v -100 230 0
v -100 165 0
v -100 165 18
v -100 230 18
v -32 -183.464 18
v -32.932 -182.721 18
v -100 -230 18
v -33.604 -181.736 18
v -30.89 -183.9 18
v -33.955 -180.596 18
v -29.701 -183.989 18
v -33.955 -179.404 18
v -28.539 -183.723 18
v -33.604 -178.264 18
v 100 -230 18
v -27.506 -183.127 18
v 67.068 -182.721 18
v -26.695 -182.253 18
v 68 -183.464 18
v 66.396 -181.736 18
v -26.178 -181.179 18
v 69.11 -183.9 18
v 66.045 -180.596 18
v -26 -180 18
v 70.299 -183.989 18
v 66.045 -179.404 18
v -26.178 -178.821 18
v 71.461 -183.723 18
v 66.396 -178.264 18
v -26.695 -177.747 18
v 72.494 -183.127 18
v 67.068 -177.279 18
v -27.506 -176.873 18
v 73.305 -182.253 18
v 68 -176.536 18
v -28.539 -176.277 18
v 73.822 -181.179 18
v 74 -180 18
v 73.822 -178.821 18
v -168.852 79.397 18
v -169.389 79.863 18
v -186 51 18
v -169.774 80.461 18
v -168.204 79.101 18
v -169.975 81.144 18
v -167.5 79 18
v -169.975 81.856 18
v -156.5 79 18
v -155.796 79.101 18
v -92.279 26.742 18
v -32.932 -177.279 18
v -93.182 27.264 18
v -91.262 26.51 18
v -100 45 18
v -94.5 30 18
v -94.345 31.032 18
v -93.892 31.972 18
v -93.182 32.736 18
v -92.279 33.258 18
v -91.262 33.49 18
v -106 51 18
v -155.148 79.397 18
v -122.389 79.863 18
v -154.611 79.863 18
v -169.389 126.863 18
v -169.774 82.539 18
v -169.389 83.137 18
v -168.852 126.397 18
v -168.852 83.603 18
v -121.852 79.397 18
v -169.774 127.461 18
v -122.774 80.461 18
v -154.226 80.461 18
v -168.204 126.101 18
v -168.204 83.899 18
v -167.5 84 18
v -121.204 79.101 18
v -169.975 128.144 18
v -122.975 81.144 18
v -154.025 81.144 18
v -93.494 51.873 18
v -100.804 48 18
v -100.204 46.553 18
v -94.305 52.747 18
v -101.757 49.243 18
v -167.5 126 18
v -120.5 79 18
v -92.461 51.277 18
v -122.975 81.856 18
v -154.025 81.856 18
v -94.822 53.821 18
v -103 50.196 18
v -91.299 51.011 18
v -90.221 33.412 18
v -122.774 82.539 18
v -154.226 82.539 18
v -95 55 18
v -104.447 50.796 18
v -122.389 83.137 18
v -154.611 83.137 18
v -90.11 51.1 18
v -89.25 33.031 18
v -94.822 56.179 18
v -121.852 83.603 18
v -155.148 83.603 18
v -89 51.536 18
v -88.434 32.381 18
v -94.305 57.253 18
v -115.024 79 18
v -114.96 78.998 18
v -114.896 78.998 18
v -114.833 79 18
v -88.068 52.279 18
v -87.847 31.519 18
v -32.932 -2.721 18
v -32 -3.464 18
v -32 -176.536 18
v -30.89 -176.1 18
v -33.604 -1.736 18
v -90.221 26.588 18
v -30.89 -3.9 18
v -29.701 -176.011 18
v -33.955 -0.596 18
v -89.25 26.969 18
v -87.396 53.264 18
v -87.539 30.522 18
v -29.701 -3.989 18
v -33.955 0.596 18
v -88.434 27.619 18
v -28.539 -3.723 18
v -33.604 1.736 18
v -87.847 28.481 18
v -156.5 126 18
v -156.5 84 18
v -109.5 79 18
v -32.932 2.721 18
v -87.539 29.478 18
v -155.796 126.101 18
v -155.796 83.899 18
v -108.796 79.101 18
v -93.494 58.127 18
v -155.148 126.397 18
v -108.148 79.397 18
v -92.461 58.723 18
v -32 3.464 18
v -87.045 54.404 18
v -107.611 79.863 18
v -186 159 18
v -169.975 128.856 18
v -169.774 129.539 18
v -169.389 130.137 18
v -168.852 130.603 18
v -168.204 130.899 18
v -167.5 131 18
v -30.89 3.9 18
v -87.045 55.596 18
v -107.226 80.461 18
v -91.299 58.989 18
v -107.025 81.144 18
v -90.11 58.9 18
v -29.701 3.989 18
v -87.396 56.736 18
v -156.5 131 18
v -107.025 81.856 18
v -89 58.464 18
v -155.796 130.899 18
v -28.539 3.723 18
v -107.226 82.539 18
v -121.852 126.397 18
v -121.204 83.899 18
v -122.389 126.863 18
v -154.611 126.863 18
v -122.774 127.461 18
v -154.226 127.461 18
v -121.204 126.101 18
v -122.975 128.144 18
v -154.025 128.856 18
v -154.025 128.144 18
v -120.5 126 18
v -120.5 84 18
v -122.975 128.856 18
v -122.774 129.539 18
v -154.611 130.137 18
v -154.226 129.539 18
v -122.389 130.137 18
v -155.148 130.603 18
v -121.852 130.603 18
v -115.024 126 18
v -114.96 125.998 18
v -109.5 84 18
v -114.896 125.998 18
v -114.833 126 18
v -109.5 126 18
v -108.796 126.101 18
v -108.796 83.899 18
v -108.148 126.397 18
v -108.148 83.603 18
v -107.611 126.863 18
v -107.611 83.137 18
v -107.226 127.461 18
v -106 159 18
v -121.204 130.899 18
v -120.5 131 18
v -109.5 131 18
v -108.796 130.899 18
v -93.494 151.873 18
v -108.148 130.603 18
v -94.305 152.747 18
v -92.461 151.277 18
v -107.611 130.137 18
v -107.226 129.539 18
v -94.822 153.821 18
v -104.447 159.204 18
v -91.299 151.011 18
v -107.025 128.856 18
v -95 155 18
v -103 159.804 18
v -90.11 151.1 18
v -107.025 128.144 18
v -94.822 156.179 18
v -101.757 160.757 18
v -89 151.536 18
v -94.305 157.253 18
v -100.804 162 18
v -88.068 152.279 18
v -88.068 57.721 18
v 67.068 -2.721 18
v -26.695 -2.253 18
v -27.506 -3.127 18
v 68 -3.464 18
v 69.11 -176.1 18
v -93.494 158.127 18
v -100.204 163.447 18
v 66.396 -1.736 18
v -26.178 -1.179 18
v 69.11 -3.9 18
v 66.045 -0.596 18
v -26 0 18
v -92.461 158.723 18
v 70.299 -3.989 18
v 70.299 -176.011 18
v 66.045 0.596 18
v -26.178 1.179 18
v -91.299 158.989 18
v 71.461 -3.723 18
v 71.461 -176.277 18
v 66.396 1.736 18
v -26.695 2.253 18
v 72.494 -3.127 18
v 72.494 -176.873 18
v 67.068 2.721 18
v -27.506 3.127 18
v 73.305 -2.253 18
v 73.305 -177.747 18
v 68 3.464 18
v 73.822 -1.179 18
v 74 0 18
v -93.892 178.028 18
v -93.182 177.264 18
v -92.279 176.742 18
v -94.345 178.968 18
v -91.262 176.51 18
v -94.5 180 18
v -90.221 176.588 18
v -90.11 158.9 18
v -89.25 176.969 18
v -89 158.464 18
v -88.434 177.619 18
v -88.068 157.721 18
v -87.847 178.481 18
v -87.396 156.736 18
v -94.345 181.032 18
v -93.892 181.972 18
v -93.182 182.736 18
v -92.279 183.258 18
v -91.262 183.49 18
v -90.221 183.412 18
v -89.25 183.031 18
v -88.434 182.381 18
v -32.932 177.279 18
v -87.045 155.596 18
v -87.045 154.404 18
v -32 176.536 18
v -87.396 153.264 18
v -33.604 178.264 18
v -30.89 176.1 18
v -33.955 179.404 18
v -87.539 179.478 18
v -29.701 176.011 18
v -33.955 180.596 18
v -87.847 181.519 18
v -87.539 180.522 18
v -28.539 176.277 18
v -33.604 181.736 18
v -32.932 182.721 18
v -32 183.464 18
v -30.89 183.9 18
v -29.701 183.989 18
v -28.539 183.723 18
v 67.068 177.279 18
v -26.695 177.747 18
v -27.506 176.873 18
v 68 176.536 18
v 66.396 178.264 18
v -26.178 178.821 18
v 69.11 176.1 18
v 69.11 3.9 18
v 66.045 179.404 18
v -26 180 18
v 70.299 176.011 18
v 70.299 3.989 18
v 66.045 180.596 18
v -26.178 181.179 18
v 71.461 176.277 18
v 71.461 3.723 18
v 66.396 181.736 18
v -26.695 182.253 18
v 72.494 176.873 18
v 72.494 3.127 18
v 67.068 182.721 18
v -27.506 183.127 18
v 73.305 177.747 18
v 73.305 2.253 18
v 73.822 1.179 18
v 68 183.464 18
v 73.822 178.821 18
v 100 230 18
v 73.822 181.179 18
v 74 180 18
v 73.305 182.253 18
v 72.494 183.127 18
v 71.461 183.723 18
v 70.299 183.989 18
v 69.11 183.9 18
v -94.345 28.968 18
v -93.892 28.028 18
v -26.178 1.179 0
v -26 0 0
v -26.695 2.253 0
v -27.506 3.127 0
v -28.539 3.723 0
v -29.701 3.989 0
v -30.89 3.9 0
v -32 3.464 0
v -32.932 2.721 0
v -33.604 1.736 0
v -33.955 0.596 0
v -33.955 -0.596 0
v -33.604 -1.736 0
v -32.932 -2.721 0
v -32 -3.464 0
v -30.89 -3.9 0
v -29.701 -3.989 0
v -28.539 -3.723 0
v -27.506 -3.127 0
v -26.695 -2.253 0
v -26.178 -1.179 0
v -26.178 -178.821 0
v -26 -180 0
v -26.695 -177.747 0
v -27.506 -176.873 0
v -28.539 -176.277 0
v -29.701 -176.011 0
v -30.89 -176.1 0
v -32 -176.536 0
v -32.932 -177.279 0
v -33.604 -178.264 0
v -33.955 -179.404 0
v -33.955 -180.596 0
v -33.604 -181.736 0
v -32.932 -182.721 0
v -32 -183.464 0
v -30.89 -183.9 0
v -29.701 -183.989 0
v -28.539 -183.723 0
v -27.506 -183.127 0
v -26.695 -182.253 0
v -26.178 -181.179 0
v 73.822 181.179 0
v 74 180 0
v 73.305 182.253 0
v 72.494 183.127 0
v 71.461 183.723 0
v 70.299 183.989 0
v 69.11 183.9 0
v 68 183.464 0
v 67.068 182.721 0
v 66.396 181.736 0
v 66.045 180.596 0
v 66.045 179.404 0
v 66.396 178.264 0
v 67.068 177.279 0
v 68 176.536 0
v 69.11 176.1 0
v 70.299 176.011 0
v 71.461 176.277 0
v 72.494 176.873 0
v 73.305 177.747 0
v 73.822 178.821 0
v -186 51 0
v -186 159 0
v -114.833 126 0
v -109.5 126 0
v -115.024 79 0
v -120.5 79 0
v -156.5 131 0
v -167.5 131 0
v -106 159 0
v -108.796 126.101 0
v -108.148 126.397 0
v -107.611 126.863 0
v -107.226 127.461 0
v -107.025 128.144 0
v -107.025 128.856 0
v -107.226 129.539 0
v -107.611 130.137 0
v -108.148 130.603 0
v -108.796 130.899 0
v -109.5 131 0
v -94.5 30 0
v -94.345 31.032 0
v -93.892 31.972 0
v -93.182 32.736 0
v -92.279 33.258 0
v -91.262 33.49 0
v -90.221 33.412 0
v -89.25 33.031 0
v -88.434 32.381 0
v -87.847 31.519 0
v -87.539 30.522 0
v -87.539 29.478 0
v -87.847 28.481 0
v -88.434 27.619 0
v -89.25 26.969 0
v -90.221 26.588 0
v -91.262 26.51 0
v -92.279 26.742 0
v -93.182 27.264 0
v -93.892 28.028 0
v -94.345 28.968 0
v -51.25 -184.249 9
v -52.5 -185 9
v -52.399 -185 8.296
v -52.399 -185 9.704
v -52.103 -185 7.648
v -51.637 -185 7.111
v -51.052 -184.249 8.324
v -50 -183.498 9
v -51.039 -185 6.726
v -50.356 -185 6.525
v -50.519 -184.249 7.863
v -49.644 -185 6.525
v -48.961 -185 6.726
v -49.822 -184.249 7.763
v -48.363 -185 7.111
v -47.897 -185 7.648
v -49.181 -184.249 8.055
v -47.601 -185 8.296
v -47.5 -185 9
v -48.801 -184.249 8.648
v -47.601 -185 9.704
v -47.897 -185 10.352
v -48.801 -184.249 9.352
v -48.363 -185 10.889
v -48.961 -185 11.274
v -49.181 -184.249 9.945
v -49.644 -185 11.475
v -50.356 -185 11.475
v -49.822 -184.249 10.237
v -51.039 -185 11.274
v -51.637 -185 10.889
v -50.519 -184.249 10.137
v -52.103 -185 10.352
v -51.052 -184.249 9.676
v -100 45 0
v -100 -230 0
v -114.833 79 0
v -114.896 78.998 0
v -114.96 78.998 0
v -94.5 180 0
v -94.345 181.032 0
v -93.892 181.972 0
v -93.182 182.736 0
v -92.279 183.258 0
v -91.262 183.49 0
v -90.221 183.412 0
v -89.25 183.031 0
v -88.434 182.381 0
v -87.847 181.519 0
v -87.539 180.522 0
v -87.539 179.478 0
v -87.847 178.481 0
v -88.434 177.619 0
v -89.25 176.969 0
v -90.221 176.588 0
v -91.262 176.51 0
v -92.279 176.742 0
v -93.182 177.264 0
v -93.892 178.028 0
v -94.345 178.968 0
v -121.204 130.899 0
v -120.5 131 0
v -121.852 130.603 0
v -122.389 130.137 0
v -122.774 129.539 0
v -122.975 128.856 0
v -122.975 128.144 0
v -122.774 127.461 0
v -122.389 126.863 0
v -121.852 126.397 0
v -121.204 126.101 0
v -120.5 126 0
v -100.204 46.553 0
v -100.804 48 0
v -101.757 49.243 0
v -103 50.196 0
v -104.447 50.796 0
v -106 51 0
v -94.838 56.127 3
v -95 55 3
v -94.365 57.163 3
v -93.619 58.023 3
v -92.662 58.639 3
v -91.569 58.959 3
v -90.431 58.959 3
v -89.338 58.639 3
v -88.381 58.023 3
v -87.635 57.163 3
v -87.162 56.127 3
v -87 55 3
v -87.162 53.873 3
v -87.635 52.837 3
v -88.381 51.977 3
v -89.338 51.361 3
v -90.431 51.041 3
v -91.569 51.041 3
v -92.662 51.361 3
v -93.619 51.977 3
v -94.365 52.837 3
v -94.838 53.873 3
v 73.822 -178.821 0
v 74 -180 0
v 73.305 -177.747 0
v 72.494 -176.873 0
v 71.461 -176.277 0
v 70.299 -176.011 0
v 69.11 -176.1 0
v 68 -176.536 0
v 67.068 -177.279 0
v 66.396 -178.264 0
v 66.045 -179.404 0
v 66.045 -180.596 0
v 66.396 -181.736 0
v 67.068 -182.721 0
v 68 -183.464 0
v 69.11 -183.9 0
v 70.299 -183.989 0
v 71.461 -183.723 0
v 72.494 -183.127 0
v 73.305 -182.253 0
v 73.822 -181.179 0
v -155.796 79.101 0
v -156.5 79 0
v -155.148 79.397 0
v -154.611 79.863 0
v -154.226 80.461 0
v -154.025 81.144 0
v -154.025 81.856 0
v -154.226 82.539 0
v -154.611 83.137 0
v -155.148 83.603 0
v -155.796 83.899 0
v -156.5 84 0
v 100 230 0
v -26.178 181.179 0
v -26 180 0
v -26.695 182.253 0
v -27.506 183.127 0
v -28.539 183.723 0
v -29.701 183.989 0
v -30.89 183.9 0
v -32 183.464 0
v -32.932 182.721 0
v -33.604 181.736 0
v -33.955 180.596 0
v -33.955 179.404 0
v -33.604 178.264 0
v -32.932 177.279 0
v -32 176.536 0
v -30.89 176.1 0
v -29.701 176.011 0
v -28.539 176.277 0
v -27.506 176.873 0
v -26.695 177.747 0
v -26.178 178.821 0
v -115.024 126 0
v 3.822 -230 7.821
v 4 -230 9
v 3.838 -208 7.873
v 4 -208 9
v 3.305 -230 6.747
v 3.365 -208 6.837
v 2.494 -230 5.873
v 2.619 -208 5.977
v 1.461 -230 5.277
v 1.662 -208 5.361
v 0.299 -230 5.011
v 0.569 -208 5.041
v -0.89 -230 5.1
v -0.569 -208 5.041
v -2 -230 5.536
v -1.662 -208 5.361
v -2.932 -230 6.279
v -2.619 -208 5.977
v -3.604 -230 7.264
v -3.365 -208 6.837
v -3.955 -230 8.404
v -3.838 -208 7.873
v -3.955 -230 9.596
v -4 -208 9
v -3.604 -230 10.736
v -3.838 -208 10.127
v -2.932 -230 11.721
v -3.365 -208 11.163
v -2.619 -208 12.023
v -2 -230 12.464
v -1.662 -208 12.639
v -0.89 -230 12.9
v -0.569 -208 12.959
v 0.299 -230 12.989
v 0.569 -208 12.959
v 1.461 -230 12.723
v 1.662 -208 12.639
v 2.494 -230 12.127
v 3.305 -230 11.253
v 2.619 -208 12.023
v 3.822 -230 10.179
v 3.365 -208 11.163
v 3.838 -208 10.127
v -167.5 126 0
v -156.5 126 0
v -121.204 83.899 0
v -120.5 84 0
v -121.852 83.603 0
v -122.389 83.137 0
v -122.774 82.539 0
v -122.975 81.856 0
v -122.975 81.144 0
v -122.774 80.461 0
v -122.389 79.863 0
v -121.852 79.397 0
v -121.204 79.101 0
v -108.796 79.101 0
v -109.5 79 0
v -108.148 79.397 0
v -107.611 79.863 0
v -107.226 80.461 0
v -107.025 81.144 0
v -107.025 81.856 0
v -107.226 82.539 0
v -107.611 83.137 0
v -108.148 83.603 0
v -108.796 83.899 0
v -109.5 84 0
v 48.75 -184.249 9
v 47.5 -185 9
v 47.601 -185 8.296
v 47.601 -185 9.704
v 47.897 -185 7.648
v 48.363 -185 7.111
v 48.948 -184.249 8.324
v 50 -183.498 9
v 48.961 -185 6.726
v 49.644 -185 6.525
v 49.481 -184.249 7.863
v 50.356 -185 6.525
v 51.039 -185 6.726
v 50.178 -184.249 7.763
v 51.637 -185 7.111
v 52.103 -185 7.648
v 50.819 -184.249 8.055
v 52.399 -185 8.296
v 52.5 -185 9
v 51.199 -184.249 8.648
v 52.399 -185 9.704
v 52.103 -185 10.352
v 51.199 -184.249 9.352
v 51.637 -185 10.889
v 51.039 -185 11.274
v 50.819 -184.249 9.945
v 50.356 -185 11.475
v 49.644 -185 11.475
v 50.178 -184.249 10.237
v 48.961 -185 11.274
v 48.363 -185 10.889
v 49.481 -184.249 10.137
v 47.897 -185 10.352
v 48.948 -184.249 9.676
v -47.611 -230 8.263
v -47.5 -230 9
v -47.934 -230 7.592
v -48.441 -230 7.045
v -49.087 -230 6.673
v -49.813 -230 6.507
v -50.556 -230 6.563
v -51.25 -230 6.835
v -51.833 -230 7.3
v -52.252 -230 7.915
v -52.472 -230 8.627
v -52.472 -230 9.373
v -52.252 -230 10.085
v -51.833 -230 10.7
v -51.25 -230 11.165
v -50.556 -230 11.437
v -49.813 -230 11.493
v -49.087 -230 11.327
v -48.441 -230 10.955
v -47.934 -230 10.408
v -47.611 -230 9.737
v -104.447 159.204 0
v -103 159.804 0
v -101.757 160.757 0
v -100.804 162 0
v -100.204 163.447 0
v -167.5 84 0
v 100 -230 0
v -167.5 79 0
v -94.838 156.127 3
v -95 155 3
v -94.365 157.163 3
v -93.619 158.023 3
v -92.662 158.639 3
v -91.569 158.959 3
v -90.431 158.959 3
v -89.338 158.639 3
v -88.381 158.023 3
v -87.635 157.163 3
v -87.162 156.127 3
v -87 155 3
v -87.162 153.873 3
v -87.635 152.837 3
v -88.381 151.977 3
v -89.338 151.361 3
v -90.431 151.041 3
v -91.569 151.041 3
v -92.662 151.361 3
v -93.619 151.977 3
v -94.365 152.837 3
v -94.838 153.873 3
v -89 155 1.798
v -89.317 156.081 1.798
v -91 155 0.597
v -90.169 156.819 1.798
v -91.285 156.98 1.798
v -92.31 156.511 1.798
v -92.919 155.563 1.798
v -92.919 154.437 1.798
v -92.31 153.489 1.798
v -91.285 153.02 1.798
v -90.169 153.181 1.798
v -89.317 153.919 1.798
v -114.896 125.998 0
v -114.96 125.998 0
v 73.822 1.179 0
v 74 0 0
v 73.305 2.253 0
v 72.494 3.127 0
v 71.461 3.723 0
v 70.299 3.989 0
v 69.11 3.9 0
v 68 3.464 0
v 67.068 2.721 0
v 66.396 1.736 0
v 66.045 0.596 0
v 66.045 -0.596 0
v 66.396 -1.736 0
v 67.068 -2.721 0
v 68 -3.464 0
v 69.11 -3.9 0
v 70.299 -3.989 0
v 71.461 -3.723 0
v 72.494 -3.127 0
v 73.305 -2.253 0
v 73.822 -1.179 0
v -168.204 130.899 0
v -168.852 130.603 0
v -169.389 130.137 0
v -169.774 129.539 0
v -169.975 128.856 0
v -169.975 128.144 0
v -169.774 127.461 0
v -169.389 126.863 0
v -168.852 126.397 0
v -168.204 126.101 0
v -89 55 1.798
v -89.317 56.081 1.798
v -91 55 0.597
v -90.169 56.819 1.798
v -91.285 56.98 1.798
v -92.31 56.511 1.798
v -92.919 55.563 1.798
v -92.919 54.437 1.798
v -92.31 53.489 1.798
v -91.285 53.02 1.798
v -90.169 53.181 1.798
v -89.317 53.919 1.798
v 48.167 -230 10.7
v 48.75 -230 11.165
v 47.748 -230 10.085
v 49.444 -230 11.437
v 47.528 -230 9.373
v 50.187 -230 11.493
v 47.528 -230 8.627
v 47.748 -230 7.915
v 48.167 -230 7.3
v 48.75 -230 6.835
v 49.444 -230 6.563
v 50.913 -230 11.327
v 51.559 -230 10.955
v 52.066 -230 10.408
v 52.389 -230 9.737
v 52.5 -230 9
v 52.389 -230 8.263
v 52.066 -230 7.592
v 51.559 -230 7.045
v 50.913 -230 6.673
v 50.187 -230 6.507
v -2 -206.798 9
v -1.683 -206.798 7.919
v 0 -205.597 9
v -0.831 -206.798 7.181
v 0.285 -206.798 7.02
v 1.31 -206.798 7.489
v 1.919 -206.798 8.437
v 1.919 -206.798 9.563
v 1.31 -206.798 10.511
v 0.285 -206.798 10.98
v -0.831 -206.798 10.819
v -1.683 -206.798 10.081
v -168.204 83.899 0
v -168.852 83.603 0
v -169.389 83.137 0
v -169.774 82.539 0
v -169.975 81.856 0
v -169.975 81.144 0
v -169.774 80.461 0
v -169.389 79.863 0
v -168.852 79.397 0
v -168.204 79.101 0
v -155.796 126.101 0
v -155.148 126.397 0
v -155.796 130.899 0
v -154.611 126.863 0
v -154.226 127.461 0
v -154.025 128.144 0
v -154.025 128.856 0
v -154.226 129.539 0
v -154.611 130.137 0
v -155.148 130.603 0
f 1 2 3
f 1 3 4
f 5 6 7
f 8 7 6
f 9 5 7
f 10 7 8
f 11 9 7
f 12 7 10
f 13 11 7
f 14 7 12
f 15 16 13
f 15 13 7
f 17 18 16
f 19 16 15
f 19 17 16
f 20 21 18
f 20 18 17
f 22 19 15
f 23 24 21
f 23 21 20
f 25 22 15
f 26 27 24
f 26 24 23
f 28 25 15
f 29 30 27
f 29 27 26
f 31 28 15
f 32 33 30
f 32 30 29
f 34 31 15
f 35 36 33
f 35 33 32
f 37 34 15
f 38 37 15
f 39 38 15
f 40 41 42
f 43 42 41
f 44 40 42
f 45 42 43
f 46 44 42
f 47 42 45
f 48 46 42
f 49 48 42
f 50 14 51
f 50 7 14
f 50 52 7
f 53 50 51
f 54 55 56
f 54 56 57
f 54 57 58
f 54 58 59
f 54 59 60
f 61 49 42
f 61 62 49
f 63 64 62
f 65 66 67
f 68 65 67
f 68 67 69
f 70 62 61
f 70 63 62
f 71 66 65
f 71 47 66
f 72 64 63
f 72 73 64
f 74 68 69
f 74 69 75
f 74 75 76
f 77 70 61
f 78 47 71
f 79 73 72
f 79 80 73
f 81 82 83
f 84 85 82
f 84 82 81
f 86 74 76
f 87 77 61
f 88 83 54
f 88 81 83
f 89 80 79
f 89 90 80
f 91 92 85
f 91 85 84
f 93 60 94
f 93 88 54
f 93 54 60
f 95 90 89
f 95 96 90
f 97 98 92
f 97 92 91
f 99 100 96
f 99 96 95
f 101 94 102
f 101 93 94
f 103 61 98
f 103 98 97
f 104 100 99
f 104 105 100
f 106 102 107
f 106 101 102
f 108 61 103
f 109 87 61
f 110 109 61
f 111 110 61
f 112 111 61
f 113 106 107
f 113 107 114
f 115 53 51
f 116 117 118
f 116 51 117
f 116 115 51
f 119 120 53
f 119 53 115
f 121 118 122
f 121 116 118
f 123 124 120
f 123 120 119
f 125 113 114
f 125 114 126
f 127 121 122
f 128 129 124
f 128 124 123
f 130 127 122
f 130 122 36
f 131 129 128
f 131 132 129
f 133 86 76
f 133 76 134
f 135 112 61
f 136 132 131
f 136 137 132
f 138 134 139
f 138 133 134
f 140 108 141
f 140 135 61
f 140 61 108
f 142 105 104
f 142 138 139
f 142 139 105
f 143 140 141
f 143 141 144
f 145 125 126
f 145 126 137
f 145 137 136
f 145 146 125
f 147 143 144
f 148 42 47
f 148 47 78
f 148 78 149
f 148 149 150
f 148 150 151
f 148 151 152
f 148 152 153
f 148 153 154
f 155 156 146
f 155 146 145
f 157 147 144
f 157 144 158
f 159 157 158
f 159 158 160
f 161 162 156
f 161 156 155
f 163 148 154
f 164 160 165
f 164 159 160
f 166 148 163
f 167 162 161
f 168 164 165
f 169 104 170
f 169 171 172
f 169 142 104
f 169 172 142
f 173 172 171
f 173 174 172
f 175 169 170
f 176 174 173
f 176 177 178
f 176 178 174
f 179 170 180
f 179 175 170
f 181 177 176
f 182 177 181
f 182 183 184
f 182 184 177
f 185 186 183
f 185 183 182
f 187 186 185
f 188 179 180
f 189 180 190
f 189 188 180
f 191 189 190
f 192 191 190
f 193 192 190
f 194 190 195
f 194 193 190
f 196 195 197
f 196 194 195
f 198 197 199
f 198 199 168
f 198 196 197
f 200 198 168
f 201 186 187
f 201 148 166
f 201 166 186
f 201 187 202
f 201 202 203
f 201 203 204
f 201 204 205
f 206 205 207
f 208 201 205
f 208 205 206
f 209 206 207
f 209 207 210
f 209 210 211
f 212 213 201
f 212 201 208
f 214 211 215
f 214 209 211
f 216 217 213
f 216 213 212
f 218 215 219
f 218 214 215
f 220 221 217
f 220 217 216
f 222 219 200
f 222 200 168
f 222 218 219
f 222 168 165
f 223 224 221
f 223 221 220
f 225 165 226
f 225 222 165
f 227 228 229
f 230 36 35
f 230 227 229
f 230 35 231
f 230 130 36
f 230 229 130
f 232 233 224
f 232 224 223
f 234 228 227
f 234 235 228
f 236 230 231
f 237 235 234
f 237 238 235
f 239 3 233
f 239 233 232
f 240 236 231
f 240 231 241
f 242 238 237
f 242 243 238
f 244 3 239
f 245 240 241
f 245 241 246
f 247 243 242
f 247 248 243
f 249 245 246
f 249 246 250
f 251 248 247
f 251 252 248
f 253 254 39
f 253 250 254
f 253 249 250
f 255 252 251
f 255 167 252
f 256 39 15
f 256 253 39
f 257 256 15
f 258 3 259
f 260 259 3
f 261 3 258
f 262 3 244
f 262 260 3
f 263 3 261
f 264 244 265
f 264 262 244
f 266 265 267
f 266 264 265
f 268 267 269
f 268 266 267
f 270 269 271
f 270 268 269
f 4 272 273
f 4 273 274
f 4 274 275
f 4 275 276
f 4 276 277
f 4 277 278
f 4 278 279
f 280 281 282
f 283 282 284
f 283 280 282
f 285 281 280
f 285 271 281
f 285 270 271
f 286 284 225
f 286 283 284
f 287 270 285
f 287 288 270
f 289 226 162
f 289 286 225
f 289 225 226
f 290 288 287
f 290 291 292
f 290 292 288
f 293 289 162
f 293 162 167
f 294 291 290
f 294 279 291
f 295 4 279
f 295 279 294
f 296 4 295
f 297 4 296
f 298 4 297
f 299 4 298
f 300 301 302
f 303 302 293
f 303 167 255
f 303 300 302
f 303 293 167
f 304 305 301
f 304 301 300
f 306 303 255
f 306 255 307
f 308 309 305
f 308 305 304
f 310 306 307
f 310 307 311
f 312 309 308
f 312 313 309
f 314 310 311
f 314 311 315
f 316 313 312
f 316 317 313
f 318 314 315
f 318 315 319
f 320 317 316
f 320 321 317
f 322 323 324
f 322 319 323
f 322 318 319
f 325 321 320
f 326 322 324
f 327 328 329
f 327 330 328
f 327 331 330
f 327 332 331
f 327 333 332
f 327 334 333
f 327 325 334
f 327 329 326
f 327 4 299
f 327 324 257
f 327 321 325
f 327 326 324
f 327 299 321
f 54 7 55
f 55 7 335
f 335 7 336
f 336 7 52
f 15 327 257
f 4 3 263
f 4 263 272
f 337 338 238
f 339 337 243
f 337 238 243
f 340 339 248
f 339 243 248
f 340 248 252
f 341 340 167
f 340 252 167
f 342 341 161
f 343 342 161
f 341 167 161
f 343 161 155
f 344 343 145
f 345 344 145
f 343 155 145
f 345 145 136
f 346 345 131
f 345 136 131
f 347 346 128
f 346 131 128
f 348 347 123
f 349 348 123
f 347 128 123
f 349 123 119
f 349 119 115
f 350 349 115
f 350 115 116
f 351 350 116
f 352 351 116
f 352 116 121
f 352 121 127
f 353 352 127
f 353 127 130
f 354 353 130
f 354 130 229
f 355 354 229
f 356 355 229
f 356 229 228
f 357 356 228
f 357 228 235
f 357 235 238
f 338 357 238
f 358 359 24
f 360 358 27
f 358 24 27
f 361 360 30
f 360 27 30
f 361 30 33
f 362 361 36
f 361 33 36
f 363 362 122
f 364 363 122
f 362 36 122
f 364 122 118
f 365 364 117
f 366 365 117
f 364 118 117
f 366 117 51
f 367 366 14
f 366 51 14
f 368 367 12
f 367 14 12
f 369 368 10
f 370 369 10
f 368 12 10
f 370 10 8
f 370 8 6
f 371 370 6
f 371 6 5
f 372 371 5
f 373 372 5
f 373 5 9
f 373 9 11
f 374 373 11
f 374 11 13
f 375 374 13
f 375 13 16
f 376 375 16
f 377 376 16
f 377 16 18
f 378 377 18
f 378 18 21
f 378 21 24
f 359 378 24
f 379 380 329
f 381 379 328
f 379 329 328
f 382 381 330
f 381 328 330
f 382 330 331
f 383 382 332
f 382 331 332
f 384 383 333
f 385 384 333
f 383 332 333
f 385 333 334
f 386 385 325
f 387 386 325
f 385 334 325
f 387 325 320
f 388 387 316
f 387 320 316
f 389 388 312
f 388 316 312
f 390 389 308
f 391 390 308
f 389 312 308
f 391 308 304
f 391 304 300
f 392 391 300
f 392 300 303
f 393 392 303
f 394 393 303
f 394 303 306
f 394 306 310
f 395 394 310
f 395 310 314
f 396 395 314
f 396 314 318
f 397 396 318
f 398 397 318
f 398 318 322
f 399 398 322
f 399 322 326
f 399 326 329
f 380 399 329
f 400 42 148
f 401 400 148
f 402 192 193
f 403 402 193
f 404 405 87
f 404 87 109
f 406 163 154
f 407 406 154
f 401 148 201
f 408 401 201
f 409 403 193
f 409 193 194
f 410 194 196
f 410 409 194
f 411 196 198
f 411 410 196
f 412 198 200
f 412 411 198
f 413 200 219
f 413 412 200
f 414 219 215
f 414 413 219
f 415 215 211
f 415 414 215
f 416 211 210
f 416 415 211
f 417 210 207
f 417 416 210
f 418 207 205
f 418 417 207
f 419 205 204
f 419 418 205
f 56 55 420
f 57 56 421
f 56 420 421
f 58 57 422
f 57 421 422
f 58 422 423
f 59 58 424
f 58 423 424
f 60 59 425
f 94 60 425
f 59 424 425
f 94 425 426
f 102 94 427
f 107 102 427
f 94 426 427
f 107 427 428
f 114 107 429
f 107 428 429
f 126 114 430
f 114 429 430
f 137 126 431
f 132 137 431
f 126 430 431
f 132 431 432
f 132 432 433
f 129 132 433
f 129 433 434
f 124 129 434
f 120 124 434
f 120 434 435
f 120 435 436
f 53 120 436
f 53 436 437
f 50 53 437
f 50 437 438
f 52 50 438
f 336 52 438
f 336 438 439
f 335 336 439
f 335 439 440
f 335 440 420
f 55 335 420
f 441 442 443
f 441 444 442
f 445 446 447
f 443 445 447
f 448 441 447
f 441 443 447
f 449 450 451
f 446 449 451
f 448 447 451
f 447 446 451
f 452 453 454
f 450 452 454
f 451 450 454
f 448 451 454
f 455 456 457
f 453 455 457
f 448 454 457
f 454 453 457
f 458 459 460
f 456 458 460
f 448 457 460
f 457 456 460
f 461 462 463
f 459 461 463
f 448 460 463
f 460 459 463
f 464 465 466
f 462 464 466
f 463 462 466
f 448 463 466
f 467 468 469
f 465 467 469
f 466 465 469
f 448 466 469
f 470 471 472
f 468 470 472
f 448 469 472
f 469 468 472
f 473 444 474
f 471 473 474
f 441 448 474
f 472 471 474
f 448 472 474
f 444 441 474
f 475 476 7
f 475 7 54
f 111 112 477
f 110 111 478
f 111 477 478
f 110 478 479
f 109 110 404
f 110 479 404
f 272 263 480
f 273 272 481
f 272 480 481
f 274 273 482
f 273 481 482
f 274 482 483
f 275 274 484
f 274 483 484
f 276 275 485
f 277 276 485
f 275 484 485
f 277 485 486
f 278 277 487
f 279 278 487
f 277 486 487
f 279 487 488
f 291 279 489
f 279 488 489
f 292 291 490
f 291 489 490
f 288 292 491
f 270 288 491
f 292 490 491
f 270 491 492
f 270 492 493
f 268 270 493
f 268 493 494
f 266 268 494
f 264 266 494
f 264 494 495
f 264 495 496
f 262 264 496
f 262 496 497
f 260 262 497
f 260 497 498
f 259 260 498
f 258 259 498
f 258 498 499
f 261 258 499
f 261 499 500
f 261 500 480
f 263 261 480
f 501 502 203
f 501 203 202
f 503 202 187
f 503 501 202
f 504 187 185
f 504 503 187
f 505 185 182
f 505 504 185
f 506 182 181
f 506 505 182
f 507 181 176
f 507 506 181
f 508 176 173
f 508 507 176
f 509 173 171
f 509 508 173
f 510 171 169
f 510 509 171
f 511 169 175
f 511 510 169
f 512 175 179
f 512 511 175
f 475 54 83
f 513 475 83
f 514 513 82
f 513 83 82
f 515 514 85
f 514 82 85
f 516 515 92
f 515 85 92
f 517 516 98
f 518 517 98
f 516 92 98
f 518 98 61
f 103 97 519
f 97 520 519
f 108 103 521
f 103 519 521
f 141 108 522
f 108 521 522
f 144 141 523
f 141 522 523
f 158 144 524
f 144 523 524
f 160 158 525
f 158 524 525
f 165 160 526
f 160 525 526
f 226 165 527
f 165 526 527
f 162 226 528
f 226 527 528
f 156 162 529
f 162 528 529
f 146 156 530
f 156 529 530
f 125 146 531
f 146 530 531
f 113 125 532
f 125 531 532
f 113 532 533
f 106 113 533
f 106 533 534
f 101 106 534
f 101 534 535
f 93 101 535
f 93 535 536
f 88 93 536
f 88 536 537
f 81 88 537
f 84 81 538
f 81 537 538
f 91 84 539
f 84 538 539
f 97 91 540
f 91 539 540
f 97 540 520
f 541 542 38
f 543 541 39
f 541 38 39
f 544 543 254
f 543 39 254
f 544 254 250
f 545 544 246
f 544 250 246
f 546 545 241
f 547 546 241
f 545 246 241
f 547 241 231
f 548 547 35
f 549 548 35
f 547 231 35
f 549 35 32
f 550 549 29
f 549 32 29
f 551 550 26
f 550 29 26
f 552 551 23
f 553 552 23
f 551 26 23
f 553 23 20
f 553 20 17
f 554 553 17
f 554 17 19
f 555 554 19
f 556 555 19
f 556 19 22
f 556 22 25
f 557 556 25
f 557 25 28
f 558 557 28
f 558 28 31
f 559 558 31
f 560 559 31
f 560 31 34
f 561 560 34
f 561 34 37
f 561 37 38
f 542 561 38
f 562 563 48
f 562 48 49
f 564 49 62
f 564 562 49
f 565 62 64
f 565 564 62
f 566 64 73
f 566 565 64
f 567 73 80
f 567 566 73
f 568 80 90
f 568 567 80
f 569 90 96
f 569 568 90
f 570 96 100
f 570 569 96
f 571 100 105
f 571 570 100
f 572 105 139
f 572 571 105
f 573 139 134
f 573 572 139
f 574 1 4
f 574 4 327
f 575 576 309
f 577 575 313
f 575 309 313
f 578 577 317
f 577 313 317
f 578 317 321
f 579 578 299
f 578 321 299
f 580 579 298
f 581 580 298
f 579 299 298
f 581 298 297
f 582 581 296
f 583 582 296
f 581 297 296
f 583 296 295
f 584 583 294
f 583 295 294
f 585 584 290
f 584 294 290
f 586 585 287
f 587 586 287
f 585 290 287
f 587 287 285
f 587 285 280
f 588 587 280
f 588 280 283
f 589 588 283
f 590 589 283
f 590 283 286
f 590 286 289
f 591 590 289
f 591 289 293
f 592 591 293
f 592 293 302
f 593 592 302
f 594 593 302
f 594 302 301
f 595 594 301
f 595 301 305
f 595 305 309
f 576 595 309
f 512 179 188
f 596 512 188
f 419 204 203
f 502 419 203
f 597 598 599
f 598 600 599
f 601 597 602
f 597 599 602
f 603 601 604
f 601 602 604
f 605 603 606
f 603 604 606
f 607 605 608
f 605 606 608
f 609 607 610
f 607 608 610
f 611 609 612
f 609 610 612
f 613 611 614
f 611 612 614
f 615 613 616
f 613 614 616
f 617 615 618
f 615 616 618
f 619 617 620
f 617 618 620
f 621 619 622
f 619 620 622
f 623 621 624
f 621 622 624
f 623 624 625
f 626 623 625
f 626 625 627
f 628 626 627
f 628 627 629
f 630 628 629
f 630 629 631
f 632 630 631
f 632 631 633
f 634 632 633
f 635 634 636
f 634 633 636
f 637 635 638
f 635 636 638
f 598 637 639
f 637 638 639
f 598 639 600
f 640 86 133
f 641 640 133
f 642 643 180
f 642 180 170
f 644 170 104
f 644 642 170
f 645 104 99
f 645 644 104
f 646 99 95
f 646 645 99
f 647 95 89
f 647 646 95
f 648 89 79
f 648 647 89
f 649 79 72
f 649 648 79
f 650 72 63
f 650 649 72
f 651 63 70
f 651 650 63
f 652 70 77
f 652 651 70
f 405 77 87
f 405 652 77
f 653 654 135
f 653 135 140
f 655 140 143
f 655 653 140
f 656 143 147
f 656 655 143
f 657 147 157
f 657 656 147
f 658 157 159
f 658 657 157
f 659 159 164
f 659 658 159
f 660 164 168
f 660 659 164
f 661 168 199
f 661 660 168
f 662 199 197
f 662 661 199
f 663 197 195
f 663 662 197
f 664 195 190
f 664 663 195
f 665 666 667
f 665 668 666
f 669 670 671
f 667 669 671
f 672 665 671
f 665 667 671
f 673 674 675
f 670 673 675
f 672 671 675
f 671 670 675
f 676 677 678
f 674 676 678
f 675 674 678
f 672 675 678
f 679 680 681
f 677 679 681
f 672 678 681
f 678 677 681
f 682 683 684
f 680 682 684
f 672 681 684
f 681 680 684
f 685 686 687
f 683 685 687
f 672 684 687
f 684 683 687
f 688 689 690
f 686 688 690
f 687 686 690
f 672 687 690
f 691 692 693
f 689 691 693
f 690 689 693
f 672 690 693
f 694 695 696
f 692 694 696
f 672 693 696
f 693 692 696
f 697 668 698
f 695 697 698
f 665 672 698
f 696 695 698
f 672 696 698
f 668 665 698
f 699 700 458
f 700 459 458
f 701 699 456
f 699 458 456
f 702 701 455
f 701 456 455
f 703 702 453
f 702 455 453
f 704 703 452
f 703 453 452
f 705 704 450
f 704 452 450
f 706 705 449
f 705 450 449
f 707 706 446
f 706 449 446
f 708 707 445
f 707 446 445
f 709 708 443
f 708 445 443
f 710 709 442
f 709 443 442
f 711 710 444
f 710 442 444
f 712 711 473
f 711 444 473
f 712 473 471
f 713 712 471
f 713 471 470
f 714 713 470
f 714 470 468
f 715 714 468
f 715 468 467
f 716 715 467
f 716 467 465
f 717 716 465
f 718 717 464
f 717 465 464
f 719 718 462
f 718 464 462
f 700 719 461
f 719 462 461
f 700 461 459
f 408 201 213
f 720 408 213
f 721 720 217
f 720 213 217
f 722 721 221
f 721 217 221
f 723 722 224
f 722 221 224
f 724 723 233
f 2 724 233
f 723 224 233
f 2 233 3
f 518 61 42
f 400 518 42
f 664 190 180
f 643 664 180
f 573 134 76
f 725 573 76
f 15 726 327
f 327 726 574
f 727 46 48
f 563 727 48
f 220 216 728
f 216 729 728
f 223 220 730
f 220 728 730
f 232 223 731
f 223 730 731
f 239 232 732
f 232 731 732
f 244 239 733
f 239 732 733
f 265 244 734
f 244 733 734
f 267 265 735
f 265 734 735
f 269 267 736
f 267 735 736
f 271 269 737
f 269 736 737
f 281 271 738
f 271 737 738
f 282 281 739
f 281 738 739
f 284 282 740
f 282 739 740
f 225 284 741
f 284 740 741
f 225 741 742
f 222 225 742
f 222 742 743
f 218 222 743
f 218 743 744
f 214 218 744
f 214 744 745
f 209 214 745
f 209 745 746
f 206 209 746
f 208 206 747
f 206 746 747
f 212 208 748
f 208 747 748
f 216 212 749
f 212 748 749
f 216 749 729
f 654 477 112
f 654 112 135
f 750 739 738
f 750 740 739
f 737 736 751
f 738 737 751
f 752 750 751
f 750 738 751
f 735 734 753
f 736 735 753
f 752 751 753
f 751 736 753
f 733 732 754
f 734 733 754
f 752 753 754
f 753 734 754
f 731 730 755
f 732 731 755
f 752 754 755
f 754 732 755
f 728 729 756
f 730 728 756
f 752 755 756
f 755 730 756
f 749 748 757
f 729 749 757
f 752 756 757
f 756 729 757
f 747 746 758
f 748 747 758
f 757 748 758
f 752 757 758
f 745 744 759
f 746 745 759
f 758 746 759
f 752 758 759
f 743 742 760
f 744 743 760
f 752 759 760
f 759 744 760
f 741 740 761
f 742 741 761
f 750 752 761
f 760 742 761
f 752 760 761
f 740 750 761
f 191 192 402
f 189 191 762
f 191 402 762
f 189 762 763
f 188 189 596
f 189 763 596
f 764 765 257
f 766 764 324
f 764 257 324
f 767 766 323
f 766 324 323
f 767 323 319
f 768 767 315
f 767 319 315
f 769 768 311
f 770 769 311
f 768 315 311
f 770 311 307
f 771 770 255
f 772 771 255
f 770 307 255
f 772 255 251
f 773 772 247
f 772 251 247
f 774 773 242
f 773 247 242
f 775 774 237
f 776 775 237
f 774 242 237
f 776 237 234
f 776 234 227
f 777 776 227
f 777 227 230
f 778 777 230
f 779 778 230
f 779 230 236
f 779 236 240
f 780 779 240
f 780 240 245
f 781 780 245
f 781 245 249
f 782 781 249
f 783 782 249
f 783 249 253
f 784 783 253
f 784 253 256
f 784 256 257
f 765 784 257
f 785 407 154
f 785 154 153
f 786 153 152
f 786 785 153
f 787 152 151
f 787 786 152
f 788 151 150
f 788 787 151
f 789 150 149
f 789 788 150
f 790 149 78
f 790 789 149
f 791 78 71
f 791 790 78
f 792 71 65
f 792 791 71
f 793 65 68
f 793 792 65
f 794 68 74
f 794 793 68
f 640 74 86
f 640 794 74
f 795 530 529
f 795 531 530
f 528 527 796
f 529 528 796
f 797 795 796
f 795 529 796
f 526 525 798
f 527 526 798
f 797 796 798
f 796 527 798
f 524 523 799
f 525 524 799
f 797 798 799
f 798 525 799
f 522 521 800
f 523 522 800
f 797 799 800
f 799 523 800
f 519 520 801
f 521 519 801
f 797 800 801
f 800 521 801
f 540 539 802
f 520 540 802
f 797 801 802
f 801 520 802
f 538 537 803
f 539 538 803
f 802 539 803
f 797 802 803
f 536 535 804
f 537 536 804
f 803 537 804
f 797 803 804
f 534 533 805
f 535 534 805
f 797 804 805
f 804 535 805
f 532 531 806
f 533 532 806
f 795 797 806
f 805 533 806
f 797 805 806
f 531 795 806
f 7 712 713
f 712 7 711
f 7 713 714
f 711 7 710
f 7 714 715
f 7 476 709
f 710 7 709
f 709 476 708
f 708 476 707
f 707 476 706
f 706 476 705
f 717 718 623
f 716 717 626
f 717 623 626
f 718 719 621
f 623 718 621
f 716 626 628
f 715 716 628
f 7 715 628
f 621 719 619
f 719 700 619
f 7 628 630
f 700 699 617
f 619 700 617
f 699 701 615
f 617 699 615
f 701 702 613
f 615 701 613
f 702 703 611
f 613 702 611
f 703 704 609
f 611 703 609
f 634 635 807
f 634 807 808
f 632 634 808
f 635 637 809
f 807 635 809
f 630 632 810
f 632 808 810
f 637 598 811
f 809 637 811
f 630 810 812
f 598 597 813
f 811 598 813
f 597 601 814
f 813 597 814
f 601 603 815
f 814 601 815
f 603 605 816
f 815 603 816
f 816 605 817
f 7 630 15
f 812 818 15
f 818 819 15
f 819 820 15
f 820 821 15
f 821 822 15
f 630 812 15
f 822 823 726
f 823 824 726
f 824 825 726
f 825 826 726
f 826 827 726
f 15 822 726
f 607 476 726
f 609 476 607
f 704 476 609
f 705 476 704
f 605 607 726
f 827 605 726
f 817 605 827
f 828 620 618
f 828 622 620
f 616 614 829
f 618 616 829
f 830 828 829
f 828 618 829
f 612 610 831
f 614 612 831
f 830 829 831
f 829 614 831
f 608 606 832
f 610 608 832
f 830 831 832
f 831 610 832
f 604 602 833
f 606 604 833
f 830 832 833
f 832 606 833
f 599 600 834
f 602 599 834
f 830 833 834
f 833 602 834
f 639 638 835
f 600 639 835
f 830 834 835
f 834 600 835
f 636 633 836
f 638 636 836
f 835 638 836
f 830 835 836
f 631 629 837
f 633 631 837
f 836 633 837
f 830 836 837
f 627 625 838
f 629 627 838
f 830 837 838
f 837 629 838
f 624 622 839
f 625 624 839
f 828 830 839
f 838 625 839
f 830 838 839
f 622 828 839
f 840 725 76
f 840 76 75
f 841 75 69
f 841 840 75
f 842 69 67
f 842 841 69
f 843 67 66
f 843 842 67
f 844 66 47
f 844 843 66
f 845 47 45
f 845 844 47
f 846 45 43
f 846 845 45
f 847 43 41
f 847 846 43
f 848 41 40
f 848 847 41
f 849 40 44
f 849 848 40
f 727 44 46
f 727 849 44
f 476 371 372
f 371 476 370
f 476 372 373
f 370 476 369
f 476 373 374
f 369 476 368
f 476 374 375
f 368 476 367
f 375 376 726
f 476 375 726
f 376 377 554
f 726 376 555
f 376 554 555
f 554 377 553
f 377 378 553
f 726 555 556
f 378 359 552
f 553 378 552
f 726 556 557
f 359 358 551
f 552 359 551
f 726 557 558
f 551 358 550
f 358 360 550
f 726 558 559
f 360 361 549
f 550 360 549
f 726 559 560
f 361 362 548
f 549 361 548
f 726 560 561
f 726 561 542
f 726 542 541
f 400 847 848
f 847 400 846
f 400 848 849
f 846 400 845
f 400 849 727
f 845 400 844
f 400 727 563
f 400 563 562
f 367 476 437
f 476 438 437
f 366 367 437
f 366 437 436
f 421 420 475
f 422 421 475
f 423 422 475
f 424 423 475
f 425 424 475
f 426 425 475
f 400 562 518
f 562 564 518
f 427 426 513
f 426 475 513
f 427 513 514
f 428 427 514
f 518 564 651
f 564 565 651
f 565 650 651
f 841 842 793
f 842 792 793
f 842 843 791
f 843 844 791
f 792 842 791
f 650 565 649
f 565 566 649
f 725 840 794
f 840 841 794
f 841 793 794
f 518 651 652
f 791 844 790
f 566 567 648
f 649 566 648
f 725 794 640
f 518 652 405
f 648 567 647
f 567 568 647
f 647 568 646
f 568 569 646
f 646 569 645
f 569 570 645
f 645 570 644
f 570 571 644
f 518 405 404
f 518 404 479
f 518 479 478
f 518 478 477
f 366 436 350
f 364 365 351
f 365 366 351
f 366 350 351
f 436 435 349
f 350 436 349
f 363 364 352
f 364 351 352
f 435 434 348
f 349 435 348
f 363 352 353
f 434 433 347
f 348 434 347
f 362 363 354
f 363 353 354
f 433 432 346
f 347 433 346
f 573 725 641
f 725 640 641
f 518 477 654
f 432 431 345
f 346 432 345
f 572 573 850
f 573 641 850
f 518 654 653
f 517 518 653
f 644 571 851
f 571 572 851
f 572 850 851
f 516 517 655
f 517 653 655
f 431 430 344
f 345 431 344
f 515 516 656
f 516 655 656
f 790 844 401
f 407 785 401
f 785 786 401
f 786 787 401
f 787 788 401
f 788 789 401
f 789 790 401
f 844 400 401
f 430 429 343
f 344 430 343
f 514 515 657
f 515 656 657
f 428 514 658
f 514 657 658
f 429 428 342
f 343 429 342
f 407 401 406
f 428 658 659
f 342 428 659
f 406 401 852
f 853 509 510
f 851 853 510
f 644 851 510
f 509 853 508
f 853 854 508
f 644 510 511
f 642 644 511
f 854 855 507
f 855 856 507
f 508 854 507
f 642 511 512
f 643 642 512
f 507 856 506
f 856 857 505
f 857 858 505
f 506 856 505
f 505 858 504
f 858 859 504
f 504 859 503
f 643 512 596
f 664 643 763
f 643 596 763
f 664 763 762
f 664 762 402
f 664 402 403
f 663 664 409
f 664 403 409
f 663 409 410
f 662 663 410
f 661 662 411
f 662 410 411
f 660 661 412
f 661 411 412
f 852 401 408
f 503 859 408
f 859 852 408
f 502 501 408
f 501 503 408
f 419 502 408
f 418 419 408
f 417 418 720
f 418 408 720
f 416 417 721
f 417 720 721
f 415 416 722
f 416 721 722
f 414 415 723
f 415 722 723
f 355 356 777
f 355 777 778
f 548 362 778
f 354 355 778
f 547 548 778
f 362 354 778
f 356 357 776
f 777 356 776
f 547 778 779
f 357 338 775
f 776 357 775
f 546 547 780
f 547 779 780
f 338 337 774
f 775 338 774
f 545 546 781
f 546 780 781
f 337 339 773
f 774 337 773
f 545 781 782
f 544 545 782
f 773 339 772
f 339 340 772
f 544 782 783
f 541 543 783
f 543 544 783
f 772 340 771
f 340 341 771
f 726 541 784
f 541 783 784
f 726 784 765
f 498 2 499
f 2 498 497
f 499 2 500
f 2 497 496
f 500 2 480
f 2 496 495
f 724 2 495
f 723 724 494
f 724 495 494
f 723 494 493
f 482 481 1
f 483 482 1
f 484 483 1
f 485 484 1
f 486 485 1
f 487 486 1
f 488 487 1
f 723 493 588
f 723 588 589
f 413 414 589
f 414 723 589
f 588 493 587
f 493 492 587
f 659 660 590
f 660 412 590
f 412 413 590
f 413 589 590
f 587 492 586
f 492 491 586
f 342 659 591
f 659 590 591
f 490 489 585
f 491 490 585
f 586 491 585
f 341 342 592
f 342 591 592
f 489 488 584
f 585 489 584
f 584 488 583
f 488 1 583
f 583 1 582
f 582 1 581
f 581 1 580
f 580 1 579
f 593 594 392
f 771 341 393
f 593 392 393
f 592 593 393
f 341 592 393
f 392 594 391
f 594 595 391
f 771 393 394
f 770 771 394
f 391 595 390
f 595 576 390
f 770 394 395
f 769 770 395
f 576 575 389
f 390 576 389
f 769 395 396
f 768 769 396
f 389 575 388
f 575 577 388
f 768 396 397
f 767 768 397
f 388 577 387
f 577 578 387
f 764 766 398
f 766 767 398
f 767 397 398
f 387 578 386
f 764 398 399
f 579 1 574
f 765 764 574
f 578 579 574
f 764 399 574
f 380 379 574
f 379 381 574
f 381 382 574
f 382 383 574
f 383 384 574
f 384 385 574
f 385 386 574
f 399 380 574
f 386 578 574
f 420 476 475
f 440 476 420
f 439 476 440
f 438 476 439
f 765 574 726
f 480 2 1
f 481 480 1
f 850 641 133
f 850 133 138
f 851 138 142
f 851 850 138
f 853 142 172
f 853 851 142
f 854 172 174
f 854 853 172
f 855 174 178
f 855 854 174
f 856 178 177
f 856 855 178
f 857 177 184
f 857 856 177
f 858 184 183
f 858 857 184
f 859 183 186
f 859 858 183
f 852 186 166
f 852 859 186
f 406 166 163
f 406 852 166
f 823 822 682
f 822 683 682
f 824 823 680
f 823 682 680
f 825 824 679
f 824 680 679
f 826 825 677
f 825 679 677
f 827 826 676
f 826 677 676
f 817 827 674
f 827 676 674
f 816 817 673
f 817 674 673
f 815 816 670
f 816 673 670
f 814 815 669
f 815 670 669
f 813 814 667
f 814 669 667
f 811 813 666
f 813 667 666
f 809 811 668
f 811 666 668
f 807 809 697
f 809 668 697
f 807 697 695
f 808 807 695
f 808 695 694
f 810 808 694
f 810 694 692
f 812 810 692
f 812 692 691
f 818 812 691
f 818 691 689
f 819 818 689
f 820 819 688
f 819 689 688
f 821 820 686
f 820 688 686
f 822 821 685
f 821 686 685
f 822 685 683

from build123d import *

# Parameters (mm, degrees)
SKETCH1_W                   = 200
SKETCH1_H                   = 460
BOSS_EXTRUDE1_DEPTH         = 18
OTWORY_USTALAJ_CE_8_0MM1_D  = 8
OTW_R_7_0_7_1_D             = 7
OTW_R_5_0_5_1_D             = 5
OTW_R_5_0_5_1_DEPTH         = 45
OTW_R_5_0_5_1_TIP           = 1.502151548
DODANIE_WYCI_GNI_CIE1_DEPTH = 18
OTW_R_5_0_5_2_D             = 5
WYTNIJ_WYCI_GNI_CIE1_DEPTH  = 297.344394244
OTW_R_8_0_8_1_D             = 8
OTW_R_8_0_8_1_DEPTH         = 15
OTW_R_8_0_8_1_TIP           = 2.403442476
OTW_R_8_0_8_2_D             = 8
OTW_R_8_0_8_2_DEPTH         = 22
OTW_R_8_0_8_2_TIP           = 2.403442476


with BuildPart() as part:
    # Sketch1 → Boss-Extrude1 (new body)
    with BuildSketch(Plane.XY):
        Rectangle(SKETCH1_W, SKETCH1_H)
    extrude(amount=BOSS_EXTRUDE1_DEPTH)

    # Otwory ustalające Ø8.0mm1 (through all)
    with Locations(Plane(origin=(0, 0, 0), x_dir=(-1, 0, 0), z_dir=(0, 0, -1))):
        with Locations((-70, 180), (-70, 0), (-70, -180), (30, -180), (30, 0), (30, 180)):
            Hole(OTWORY_USTALAJ_CE_8_0MM1_D / 2)

    # Otwór Ø7.0 (7)1 (through all)
    with Locations(Plane.XY.offset(18)):
        with Locations((-91, 180), (-91, 30)):
            Hole(OTW_R_7_0_7_1_D / 2)

    # Otwór Ø5.0 (5)1
    with Locations(Plane(origin=(0, -230, 0), x_dir=(-1, 0, 0), z_dir=(0, -1, 0))):
        with Locations((50, -9), (-50, -9)):
            Hole(OTW_R_5_0_5_1_D / 2, depth=OTW_R_5_0_5_1_DEPTH)
            with Locations((0, 0, -(OTW_R_5_0_5_1_DEPTH + OTW_R_5_0_5_1_TIP / 2))):  # 118° drill point
                Cone(0, OTW_R_5_0_5_1_D / 2, OTW_R_5_0_5_1_TIP, mode=Mode.SUBTRACT)

    # Szkic8 → Dodanie-wyciągnięcie1 (add)
    with BuildSketch(Plane.XY.offset(18)):
        with BuildLine():
            Line((-100, 165), (-100, 45))
            ThreePointArc((-100, 45), (-101.757359313, 49.242640687), (-106, 51))
            Line((-106, 51), (-186, 51))
            Line((-186, 51), (-186, 159))
            Line((-186, 159), (-106, 159))
            ThreePointArc((-106, 159), (-101.757359313, 160.757359313), (-100, 165))
        make_face()
    extrude(amount=-DODANIE_WYCI_GNI_CIE1_DEPTH)

    # Otwór Ø5.0 (5)2 (through all)
    with Locations(Plane.XY.offset(18)):
        with Locations((-161.928446298, 128.5), (-114.928446334, 128.498158688), (-114.928446334, 81.498158688), (-161.928446298, 81.5)):
            Hole(OTW_R_5_0_5_2_D / 2)

    # Szkic11 → Wytnij-wyciągnięcie1 (cut, through all)
    with BuildSketch(Plane(origin=(0, 0, 0), x_dir=(-1, 0, 0), z_dir=(0, 0, -1))):
        with BuildLine():
            Line((109.5, 131), (120.5, 131))
            ThreePointArc((120.5, 131), (123, 128.5), (120.5, 126))
            Line((120.5, 126), (109.5, 126))
            ThreePointArc((109.5, 126), (107, 128.5), (109.5, 131))
        make_face()
        with BuildLine():
            Line((156.5, 131), (167.5, 131))
            ThreePointArc((167.5, 131), (170, 128.5), (167.5, 126))
            Line((167.5, 126), (156.5, 126))
            ThreePointArc((156.5, 126), (154, 128.5), (156.5, 131))
        make_face()
        with BuildLine():
            Line((109.5, 84), (120.5, 84))
            ThreePointArc((120.5, 84), (123, 81.5), (120.5, 79))
            Line((120.5, 79), (109.5, 79))
            ThreePointArc((109.5, 79), (107, 81.5), (109.5, 84))
        make_face()
        with BuildLine():
            Line((156.5, 84), (167.5, 84))
            ThreePointArc((167.5, 84), (170, 81.5), (167.5, 79))
            Line((167.5, 79), (156.5, 79))
            ThreePointArc((156.5, 79), (154, 81.5), (156.5, 84))
        make_face()
    extrude(amount=-WYTNIJ_WYCI_GNI_CIE1_DEPTH, mode=Mode.SUBTRACT)

    # Otwór Ø8.0 (8)1
    with Locations(Plane.XY.offset(18)):
        with Locations((-91, 155), (-91, 55)):
            Hole(OTW_R_8_0_8_1_D / 2, depth=OTW_R_8_0_8_1_DEPTH)
            with Locations((0, 0, -(OTW_R_8_0_8_1_DEPTH + OTW_R_8_0_8_1_TIP / 2))):  # 118° drill point
                Cone(0, OTW_R_8_0_8_1_D / 2, OTW_R_8_0_8_1_TIP, mode=Mode.SUBTRACT)

    # Otwór Ø8.0 (8)2
    with Locations(Plane(origin=(0, -230, 0), x_dir=(-1, 0, 0), z_dir=(0, -1, 0))):
        with Locations((0, -9)):
            Hole(OTW_R_8_0_8_2_D / 2, depth=OTW_R_8_0_8_2_DEPTH)
            with Locations((0, 0, -(OTW_R_8_0_8_2_DEPTH + OTW_R_8_0_8_2_TIP / 2))):  # 118° drill point
                Cone(0, OTW_R_8_0_8_2_D / 2, OTW_R_8_0_8_2_TIP, mode=Mode.SUBTRACT)


solid = part.part
